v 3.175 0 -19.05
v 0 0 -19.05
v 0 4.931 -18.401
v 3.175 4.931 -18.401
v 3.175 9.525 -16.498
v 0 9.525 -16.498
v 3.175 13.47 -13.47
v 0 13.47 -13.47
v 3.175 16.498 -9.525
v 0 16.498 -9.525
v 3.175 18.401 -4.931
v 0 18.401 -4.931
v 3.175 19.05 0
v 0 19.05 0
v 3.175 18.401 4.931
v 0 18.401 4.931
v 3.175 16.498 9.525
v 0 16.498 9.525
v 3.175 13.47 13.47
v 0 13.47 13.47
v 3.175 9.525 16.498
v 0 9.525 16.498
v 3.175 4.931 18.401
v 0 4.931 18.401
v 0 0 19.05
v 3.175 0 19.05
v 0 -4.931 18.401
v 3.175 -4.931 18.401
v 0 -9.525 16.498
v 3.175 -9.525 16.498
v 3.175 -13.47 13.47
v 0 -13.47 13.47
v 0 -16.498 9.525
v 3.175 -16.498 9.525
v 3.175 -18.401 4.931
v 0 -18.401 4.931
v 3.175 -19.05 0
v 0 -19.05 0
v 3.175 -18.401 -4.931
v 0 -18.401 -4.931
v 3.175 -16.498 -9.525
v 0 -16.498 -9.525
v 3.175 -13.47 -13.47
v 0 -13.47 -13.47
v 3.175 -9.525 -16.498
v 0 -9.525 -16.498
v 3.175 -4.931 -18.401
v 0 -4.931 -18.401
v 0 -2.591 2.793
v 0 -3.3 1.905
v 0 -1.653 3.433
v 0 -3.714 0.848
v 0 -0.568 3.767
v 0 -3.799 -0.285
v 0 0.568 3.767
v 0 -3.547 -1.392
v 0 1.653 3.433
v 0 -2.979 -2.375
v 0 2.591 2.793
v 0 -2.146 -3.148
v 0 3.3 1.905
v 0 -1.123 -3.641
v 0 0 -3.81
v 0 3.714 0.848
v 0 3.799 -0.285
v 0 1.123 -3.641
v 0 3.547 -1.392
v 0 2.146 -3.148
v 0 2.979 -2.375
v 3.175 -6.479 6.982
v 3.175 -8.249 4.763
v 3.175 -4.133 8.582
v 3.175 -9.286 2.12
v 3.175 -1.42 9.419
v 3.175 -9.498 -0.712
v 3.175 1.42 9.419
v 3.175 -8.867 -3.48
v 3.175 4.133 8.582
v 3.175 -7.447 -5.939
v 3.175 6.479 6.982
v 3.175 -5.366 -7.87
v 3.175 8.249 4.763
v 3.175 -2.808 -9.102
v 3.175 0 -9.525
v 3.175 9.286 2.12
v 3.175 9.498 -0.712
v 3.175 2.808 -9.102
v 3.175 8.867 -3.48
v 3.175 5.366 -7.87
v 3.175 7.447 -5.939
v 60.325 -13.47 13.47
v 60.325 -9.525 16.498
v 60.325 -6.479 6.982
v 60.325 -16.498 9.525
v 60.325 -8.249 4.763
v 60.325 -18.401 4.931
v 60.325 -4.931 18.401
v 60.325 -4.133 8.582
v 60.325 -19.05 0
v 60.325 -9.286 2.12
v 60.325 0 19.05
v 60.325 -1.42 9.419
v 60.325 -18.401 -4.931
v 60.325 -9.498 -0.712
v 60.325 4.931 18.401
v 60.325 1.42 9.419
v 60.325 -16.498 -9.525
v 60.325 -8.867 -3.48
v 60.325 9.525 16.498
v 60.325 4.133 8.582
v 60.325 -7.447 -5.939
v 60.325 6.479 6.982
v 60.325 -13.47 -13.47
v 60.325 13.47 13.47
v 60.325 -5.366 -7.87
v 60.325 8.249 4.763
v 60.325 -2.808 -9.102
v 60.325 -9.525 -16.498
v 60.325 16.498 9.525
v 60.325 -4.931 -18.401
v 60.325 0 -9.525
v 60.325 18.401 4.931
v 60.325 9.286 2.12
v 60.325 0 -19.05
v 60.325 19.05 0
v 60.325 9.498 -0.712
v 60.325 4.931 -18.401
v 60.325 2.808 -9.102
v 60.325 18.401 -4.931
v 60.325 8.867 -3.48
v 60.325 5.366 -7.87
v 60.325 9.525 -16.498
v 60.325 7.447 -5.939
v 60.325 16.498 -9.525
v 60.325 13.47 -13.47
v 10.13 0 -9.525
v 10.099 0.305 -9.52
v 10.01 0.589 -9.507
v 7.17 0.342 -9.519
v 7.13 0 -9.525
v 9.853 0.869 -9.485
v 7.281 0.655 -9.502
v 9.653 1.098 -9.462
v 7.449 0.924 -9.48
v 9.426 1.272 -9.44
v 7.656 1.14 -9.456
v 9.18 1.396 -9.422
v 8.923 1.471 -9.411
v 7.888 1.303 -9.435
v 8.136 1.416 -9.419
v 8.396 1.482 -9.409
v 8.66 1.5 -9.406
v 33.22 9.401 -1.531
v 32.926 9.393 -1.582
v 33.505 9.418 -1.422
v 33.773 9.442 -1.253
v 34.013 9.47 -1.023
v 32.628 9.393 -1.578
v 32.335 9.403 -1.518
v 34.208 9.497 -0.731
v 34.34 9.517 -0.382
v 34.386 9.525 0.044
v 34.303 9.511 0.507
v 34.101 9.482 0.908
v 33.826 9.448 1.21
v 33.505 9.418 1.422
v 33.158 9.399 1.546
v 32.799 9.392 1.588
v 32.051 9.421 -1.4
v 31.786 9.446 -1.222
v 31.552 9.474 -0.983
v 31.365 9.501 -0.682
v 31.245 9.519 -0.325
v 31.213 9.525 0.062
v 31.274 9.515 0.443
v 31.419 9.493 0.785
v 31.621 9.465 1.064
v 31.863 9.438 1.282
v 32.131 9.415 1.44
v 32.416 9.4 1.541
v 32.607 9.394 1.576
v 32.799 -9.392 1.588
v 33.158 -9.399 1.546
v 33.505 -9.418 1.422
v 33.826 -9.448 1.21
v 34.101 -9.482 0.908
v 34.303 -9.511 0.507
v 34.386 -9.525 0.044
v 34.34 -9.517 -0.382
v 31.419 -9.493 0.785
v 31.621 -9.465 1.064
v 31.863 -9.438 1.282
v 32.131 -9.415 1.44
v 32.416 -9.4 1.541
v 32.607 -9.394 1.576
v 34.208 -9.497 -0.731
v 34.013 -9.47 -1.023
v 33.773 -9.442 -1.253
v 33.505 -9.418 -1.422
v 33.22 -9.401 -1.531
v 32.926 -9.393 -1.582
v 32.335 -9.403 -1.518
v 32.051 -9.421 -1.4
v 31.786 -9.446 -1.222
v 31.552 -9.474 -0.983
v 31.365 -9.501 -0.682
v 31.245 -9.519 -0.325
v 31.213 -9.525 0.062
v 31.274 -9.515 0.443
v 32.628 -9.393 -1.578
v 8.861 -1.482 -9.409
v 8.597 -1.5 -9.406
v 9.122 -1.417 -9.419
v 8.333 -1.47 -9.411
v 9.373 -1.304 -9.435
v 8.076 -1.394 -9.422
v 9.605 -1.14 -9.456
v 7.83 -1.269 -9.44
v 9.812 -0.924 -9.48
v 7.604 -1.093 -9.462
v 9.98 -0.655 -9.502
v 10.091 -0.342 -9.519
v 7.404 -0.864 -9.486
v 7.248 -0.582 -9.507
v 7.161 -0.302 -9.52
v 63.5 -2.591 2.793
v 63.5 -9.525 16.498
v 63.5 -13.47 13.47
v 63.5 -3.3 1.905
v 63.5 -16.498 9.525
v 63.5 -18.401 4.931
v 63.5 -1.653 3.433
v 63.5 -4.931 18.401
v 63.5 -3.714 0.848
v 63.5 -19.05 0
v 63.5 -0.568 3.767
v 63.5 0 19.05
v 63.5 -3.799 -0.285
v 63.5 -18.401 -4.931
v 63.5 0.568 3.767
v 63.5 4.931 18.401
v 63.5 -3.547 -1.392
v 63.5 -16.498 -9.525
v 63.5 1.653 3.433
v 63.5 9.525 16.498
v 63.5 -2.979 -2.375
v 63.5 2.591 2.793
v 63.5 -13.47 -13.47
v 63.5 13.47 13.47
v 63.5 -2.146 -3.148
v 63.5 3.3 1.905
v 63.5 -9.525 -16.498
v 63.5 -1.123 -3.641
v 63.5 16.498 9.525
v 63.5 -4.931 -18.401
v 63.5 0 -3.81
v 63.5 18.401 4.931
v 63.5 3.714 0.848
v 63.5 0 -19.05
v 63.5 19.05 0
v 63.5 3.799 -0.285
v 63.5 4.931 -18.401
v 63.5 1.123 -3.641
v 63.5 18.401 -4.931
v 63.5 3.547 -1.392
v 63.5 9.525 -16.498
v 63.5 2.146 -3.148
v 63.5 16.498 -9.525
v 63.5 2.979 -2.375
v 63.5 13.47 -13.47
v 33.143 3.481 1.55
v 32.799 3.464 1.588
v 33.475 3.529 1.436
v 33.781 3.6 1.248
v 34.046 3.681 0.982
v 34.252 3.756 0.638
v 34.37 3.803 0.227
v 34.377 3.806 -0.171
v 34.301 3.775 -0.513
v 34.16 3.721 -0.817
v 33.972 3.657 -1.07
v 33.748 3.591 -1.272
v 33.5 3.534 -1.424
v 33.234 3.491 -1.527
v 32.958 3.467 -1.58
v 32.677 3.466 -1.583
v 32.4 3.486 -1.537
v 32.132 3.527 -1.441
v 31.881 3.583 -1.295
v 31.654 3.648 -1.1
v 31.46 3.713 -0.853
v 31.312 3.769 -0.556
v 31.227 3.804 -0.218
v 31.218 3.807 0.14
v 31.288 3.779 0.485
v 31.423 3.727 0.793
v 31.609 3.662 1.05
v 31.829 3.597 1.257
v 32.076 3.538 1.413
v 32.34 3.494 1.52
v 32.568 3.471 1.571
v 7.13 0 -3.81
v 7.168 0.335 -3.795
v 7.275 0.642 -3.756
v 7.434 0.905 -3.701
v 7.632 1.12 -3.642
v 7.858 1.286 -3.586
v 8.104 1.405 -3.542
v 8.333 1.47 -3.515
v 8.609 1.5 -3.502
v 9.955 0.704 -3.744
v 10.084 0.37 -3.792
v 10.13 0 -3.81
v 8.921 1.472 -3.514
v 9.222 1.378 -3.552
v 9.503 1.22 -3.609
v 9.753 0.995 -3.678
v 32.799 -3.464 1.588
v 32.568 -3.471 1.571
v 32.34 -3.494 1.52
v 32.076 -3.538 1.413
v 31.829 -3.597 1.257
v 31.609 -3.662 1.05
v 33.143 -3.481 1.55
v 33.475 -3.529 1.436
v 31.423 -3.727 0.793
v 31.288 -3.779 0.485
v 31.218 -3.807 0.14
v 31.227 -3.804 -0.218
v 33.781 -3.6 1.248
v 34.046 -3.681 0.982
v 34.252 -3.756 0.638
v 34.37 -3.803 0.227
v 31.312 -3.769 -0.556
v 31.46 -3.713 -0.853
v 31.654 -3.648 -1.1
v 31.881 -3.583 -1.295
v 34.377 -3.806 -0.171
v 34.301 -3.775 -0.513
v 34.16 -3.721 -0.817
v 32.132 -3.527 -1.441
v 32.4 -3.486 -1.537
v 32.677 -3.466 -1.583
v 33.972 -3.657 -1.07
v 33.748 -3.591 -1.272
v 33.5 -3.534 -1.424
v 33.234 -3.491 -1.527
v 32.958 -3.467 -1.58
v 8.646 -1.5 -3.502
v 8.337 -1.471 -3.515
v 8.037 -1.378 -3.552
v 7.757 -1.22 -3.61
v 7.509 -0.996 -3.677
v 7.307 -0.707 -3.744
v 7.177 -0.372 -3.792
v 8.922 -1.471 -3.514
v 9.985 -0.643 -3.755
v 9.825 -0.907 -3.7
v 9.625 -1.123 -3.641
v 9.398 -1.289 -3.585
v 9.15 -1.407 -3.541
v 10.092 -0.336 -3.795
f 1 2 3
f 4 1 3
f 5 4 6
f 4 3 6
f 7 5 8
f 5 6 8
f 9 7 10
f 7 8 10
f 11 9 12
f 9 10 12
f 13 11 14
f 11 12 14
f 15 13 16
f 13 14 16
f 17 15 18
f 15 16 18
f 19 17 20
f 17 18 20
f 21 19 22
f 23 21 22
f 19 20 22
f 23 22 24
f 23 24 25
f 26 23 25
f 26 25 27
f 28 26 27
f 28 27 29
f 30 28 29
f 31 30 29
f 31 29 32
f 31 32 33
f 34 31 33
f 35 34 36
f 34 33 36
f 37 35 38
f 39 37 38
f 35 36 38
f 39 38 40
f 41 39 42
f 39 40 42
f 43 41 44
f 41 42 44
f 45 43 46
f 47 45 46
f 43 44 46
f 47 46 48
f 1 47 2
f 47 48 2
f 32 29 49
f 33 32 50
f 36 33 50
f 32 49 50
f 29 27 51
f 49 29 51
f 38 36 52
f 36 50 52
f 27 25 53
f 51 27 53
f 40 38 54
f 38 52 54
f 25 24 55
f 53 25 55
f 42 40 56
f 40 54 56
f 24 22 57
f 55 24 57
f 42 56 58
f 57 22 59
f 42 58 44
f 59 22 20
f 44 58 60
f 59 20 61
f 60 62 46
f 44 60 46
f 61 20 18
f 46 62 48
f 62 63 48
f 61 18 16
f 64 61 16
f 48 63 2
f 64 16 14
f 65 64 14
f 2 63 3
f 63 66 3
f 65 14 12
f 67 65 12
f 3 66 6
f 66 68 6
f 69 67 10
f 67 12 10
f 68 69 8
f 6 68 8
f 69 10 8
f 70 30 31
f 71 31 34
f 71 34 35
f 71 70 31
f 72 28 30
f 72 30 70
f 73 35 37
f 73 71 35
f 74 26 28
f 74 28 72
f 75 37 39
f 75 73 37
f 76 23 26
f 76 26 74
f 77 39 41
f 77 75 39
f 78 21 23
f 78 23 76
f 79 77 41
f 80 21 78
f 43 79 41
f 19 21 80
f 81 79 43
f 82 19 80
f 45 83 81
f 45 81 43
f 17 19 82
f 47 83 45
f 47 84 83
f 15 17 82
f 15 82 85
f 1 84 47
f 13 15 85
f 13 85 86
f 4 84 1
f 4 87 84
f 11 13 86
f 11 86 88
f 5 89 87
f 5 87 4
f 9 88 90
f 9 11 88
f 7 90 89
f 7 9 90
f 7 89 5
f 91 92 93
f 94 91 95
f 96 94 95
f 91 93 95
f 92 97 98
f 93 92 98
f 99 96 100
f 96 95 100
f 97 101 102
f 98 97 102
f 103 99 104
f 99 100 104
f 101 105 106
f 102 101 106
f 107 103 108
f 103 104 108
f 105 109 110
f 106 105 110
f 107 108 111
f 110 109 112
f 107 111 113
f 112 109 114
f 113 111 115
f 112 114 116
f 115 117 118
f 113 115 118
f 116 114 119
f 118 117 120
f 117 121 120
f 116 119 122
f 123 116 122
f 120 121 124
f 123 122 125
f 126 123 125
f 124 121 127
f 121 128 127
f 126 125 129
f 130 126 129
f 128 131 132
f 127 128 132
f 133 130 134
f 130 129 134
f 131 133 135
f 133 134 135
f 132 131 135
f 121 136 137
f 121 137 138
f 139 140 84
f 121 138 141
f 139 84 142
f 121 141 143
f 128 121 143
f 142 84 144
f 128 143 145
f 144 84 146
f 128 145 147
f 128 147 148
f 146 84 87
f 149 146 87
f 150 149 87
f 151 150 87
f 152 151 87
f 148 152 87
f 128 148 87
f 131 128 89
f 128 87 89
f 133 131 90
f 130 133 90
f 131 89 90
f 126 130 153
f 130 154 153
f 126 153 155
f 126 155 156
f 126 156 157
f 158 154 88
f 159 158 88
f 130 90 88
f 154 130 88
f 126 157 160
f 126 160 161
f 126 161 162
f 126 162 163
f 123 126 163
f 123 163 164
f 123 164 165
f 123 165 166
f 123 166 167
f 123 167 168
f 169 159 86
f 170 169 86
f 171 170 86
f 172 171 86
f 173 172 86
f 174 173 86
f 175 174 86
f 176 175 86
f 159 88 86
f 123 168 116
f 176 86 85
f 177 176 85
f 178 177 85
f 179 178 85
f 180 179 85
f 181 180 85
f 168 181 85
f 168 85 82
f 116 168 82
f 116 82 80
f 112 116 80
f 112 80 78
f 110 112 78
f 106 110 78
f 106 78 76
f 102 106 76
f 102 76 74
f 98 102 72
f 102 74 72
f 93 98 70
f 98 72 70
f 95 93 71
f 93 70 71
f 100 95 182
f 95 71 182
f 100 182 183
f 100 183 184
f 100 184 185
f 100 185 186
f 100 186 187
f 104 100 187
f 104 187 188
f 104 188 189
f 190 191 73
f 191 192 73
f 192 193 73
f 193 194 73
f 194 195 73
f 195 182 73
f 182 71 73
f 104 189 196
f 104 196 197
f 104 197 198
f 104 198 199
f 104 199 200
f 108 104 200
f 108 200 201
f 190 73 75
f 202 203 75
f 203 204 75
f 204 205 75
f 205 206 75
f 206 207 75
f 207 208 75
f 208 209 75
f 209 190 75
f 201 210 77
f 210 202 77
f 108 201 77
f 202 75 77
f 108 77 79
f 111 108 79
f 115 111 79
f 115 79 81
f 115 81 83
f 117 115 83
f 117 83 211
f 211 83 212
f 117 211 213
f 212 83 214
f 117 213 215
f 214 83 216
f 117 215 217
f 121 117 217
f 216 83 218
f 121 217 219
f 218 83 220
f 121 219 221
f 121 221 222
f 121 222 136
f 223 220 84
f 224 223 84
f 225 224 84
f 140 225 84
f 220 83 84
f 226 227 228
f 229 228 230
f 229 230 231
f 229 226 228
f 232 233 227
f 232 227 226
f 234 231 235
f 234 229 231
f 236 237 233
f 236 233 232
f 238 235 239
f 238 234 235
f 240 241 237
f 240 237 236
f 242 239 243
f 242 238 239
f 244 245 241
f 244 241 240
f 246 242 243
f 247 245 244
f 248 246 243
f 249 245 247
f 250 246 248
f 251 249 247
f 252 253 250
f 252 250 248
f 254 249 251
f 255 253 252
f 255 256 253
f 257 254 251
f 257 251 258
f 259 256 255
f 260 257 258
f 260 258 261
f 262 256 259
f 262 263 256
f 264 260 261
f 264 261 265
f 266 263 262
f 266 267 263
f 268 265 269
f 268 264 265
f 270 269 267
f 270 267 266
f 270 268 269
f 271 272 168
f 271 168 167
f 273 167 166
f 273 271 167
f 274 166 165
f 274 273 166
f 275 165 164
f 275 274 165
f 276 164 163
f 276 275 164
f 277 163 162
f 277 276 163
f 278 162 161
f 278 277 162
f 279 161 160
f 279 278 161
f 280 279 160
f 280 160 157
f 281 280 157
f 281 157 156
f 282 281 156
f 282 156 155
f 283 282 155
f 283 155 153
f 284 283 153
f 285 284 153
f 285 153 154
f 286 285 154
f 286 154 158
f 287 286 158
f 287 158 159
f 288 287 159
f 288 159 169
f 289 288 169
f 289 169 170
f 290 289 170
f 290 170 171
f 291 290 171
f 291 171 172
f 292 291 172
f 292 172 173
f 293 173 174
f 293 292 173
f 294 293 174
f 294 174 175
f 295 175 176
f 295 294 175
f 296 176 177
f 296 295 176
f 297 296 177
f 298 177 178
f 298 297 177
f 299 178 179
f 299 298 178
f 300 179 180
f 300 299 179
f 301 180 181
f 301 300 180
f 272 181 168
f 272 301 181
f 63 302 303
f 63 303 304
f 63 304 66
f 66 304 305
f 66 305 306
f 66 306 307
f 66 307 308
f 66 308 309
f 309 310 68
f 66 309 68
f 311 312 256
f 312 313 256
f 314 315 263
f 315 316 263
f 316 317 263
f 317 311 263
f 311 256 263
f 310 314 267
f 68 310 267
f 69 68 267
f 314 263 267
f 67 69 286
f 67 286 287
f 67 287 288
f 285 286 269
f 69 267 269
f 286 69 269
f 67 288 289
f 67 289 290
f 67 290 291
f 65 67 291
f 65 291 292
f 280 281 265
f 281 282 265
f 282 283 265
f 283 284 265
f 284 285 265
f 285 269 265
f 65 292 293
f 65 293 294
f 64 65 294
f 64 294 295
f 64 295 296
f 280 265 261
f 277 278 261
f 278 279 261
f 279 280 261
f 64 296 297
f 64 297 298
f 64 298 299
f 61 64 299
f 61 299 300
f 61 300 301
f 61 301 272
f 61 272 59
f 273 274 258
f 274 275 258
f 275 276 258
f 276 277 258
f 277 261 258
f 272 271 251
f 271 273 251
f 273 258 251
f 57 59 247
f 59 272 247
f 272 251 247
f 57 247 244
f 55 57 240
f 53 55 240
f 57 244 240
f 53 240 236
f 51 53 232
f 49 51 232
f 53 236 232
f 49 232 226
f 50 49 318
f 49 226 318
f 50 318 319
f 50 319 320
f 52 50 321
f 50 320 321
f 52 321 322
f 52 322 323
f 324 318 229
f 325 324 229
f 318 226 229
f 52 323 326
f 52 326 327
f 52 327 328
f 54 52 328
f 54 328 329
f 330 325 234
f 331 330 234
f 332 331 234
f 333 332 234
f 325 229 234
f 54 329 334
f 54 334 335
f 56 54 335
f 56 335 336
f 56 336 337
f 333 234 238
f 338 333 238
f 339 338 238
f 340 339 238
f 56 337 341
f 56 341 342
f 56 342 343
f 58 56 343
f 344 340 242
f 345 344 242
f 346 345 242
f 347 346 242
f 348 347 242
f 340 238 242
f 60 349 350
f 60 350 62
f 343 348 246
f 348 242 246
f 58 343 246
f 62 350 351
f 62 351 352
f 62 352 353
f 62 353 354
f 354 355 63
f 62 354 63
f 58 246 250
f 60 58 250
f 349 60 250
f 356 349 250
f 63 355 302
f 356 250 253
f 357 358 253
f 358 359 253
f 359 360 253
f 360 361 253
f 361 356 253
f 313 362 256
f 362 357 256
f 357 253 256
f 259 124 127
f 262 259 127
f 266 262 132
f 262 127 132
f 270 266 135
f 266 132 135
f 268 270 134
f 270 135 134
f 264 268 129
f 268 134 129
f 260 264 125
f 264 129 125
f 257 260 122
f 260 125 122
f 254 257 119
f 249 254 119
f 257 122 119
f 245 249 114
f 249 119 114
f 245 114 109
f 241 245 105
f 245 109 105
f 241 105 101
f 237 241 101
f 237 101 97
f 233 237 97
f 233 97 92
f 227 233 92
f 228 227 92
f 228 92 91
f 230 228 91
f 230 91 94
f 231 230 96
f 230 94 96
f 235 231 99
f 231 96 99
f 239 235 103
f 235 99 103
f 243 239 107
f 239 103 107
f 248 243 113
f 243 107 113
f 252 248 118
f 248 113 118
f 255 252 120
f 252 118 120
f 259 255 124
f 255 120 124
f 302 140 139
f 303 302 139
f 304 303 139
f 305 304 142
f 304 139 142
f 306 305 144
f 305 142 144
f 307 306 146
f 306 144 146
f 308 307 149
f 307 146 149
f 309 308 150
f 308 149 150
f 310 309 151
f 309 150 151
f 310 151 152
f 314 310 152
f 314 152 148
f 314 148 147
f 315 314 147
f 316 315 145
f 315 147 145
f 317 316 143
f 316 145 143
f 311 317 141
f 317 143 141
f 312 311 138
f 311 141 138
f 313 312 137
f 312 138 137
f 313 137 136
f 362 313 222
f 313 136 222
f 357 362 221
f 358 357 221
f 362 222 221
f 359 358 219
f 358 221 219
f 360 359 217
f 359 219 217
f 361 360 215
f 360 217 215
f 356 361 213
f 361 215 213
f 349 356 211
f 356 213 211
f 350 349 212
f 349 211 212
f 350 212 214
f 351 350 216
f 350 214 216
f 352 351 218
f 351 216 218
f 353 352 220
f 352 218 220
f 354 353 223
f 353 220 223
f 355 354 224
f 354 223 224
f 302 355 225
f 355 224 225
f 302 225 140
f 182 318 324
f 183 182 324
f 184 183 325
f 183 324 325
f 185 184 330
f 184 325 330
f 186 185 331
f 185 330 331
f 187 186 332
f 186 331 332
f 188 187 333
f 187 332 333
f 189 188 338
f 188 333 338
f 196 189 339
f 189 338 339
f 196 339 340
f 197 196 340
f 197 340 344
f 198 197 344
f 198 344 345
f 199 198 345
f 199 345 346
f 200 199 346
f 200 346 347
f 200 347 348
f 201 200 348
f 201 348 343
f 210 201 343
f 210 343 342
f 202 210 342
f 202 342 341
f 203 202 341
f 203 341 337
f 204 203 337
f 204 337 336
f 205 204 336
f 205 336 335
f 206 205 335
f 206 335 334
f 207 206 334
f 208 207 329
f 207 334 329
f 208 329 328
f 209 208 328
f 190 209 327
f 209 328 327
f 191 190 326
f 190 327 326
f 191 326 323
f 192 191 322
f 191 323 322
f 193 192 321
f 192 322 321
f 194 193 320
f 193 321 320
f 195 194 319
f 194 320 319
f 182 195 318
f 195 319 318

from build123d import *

# Parameters (mm, degrees)
SKETCH1_R               = 19.05
BOSS_EXTRUDE1_DEPTH     = 3.175
SKETCH2_R               = 9.525
BOSS_EXTRUDE2_DEPTH     = 57.15
SKETCH3_R               = 19.05
BOSS_EXTRUDE3_DEPTH     = 3.175
SKETCH4_R               = 3.81
CUT_EXTRUDE1_DEPTH      = 63.5
CUT_EXTRUDE2_REACH      = 30.575
CUT_EXTRUDE2_END_RADIUS = 3.81
SKETCH5_R               = 1.5
SKETCH6_R               = 1.5875
CUT_EXTRUDE3_DEPTH      = 20.05
CUT_EXTRUDE3_DEPTH_BACK = 20.05


with BuildPart() as part:
    # Sketch1 → Boss-Extrude1 (new body)
    with BuildSketch(Plane(origin=(0, 0, 0), x_dir=(0, 0, -1), z_dir=(1, 0, 0))):
        Circle(SKETCH1_R)
    extrude(amount=BOSS_EXTRUDE1_DEPTH)

    # Sketch2 → Boss-Extrude2 (add)
    with BuildSketch(Plane(origin=(3.175, 0, 0), x_dir=(0, 0, -1), z_dir=(1, 0, 0))):
        Circle(SKETCH2_R)
    extrude(amount=BOSS_EXTRUDE2_DEPTH)

    # Sketch3 → Boss-Extrude3 (add)
    with BuildSketch(Plane(origin=(60.325, 0, 0), x_dir=(0, 0, -1), z_dir=(1, 0, 0))):
        Circle(SKETCH3_R)
    extrude(amount=BOSS_EXTRUDE3_DEPTH)

    # Sketch4 → Cut-Extrude1 (cut)
    with BuildSketch(Plane(origin=(63.5, 0, 0), x_dir=(0, 0, -1), z_dir=(1, 0, 0))):
        Circle(SKETCH4_R)
    extrude(amount=-CUT_EXTRUDE1_DEPTH, mode=Mode.SUBTRACT)

    # Cut-Extrude2: up to this cylinder (the profile starts outside it)
    cut_extrude2_end = Plane(origin=(8.630484, 0, 0), z_dir=(1, 0, 0)) * Cylinder(CUT_EXTRUDE2_END_RADIUS, 69.77, mode=Mode.PRIVATE)
    # Sketch5 → Cut-Extrude2 (cut, up to the surface)
    with BuildSketch(Plane(origin=(0, 0, -9.525), x_dir=(-1, 0, 0), z_dir=(0, 0, -1)), mode=Mode.PRIVATE) as cut_extrude2_sk1:
        with Locations((-8.630483707, 0)):
            Circle(SKETCH5_R)
    cut_extrude2_tool1 = extrude(cut_extrude2_sk1.sketch, amount=-CUT_EXTRUDE2_REACH, mode=Mode.PRIVATE) - cut_extrude2_end
    add(cut_extrude2_tool1.solids().sort_by_distance((8.630484, 0, -9.525))[0], mode=Mode.SUBTRACT)

    # Sketch6 → Cut-Extrude3 (cut, two sides)
    with BuildSketch(Plane(origin=(0, 0, 0), x_dir=(1, 0, 0), z_dir=(0, 1, 0))) as cut_extrude3_sk:
        with Locations(Location((32.798989334, 0, 0), (0, 0, 270))):  # turned: the seam where the file's is
            Circle(SKETCH6_R)
    extrude(amount=CUT_EXTRUDE3_DEPTH, mode=Mode.SUBTRACT)
    extrude(cut_extrude3_sk.sketch, amount=-CUT_EXTRUDE3_DEPTH_BACK, mode=Mode.SUBTRACT)


solid = part.part
